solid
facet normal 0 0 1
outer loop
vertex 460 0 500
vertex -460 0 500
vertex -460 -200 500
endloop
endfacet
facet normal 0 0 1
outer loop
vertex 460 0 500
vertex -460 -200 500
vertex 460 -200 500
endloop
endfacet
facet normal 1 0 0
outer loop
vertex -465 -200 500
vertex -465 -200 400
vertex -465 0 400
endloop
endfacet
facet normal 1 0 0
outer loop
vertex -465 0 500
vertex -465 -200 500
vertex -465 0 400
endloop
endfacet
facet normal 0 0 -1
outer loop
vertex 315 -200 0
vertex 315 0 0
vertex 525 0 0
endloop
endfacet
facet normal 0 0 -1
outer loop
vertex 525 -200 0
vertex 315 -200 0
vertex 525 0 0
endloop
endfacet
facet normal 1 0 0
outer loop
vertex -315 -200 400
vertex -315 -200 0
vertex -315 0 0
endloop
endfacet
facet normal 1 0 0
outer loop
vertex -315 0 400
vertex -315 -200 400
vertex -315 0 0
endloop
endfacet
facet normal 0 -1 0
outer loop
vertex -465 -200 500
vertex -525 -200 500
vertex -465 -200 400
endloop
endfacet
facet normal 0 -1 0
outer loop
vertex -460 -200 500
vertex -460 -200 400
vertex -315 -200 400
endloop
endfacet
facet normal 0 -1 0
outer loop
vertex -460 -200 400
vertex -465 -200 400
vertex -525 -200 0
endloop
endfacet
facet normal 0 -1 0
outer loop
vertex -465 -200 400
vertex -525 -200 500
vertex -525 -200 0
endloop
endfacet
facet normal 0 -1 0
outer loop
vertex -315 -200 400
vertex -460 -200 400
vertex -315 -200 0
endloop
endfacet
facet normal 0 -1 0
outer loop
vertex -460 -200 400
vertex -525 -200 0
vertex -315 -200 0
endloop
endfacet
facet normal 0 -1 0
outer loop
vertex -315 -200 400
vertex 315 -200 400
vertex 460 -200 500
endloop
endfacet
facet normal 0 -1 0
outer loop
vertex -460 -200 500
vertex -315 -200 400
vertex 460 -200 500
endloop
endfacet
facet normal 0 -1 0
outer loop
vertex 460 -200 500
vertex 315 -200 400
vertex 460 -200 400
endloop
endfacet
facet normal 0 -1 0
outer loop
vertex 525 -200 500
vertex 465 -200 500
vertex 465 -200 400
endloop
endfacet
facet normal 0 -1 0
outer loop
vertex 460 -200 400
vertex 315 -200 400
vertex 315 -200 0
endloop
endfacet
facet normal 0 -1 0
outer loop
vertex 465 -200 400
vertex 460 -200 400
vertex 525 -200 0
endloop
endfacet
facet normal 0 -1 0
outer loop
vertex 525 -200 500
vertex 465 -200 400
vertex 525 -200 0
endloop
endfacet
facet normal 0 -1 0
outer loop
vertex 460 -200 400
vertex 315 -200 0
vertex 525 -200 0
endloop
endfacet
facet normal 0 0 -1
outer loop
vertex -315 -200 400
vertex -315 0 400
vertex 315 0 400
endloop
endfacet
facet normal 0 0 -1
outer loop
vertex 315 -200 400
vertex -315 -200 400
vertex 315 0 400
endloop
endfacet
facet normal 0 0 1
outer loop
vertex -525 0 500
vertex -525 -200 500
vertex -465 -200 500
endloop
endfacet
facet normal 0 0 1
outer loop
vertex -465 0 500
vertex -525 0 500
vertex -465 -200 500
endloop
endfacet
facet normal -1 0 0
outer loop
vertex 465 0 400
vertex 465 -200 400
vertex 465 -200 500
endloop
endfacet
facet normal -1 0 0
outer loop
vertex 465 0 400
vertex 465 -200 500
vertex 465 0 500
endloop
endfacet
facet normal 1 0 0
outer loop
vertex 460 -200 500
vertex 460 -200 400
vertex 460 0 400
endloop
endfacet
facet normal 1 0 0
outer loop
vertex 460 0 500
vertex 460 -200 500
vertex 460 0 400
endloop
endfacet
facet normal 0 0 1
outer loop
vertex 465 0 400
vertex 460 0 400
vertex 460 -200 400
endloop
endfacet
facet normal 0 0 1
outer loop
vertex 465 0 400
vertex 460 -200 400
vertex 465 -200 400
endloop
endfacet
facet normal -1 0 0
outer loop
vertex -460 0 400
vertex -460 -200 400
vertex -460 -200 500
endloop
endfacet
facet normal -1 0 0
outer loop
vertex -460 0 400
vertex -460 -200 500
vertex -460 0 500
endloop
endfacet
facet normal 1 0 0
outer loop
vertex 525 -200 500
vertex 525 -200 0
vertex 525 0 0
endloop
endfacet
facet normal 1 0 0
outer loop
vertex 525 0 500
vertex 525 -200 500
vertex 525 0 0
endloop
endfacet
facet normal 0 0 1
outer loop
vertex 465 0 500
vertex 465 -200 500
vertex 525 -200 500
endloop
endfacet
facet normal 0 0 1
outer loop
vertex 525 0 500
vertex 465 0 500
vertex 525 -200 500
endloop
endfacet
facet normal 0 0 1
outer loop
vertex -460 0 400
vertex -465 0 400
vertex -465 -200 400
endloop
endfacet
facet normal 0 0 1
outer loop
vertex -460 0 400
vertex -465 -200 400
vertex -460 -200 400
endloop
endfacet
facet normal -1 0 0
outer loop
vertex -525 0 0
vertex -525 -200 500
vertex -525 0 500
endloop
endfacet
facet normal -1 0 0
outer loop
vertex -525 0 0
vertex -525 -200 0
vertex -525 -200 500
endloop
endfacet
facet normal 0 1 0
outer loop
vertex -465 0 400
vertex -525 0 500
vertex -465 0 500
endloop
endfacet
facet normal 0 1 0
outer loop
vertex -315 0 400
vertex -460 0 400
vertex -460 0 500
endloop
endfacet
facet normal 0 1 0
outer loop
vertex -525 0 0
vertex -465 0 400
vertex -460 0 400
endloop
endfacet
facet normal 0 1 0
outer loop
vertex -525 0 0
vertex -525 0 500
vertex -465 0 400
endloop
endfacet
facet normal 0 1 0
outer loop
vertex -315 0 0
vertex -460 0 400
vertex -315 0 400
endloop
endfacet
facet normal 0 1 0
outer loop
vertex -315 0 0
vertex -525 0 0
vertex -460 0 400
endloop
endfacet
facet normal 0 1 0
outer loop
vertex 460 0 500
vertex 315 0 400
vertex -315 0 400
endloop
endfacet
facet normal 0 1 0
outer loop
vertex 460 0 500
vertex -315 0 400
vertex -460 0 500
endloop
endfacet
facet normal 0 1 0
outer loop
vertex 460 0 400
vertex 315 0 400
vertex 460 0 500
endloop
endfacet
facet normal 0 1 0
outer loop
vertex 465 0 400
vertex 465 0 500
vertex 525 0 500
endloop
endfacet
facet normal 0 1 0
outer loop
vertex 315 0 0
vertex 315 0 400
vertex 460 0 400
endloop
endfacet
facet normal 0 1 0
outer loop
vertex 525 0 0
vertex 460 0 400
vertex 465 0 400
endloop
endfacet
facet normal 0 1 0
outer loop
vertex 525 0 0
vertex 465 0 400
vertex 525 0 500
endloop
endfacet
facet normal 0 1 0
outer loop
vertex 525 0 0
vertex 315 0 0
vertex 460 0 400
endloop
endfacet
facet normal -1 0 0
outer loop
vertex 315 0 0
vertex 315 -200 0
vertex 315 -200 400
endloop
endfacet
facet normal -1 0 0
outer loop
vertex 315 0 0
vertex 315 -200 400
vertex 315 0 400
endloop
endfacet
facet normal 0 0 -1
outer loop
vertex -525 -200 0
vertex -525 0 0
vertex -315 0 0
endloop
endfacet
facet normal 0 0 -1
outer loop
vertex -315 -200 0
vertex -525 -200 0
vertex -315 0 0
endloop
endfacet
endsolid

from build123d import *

# Parameters (mm, degrees)
F0_W     = 210
F0_H     = 200
F1_DEPTH = 400
F2_W     = 920
F2_H     = 200
F3_DEPTH = 100
F4_W     = 60
F4_H     = 200
F5_DEPTH = 100


with BuildPart() as f1:
    # F0 (on Top) → F1 (new body)
    with BuildSketch(Plane.XY):
        with Locations((-420, -100)):
            Rectangle(F0_W, F0_H)
        with Locations((420, -100)):
            Rectangle(F0_W, F0_H)
    extrude(amount=F1_DEPTH)

    # F2 (on face) → F3 (join)
    with BuildSketch(Plane.XY.offset(400)):
        with Locations((0, -100)):
            Rectangle(F2_W, F2_H)
    extrude(amount=F3_DEPTH)

    # F4 (on face) → F5 (join)
    with BuildSketch(Plane.XY.offset(400)):
        with Locations((-495, -100)):
            Rectangle(F4_W, F4_H)
        with Locations((495, -100)):
            Rectangle(F4_W, F4_H)
    extrude(amount=F5_DEPTH)


solid = f1.part
